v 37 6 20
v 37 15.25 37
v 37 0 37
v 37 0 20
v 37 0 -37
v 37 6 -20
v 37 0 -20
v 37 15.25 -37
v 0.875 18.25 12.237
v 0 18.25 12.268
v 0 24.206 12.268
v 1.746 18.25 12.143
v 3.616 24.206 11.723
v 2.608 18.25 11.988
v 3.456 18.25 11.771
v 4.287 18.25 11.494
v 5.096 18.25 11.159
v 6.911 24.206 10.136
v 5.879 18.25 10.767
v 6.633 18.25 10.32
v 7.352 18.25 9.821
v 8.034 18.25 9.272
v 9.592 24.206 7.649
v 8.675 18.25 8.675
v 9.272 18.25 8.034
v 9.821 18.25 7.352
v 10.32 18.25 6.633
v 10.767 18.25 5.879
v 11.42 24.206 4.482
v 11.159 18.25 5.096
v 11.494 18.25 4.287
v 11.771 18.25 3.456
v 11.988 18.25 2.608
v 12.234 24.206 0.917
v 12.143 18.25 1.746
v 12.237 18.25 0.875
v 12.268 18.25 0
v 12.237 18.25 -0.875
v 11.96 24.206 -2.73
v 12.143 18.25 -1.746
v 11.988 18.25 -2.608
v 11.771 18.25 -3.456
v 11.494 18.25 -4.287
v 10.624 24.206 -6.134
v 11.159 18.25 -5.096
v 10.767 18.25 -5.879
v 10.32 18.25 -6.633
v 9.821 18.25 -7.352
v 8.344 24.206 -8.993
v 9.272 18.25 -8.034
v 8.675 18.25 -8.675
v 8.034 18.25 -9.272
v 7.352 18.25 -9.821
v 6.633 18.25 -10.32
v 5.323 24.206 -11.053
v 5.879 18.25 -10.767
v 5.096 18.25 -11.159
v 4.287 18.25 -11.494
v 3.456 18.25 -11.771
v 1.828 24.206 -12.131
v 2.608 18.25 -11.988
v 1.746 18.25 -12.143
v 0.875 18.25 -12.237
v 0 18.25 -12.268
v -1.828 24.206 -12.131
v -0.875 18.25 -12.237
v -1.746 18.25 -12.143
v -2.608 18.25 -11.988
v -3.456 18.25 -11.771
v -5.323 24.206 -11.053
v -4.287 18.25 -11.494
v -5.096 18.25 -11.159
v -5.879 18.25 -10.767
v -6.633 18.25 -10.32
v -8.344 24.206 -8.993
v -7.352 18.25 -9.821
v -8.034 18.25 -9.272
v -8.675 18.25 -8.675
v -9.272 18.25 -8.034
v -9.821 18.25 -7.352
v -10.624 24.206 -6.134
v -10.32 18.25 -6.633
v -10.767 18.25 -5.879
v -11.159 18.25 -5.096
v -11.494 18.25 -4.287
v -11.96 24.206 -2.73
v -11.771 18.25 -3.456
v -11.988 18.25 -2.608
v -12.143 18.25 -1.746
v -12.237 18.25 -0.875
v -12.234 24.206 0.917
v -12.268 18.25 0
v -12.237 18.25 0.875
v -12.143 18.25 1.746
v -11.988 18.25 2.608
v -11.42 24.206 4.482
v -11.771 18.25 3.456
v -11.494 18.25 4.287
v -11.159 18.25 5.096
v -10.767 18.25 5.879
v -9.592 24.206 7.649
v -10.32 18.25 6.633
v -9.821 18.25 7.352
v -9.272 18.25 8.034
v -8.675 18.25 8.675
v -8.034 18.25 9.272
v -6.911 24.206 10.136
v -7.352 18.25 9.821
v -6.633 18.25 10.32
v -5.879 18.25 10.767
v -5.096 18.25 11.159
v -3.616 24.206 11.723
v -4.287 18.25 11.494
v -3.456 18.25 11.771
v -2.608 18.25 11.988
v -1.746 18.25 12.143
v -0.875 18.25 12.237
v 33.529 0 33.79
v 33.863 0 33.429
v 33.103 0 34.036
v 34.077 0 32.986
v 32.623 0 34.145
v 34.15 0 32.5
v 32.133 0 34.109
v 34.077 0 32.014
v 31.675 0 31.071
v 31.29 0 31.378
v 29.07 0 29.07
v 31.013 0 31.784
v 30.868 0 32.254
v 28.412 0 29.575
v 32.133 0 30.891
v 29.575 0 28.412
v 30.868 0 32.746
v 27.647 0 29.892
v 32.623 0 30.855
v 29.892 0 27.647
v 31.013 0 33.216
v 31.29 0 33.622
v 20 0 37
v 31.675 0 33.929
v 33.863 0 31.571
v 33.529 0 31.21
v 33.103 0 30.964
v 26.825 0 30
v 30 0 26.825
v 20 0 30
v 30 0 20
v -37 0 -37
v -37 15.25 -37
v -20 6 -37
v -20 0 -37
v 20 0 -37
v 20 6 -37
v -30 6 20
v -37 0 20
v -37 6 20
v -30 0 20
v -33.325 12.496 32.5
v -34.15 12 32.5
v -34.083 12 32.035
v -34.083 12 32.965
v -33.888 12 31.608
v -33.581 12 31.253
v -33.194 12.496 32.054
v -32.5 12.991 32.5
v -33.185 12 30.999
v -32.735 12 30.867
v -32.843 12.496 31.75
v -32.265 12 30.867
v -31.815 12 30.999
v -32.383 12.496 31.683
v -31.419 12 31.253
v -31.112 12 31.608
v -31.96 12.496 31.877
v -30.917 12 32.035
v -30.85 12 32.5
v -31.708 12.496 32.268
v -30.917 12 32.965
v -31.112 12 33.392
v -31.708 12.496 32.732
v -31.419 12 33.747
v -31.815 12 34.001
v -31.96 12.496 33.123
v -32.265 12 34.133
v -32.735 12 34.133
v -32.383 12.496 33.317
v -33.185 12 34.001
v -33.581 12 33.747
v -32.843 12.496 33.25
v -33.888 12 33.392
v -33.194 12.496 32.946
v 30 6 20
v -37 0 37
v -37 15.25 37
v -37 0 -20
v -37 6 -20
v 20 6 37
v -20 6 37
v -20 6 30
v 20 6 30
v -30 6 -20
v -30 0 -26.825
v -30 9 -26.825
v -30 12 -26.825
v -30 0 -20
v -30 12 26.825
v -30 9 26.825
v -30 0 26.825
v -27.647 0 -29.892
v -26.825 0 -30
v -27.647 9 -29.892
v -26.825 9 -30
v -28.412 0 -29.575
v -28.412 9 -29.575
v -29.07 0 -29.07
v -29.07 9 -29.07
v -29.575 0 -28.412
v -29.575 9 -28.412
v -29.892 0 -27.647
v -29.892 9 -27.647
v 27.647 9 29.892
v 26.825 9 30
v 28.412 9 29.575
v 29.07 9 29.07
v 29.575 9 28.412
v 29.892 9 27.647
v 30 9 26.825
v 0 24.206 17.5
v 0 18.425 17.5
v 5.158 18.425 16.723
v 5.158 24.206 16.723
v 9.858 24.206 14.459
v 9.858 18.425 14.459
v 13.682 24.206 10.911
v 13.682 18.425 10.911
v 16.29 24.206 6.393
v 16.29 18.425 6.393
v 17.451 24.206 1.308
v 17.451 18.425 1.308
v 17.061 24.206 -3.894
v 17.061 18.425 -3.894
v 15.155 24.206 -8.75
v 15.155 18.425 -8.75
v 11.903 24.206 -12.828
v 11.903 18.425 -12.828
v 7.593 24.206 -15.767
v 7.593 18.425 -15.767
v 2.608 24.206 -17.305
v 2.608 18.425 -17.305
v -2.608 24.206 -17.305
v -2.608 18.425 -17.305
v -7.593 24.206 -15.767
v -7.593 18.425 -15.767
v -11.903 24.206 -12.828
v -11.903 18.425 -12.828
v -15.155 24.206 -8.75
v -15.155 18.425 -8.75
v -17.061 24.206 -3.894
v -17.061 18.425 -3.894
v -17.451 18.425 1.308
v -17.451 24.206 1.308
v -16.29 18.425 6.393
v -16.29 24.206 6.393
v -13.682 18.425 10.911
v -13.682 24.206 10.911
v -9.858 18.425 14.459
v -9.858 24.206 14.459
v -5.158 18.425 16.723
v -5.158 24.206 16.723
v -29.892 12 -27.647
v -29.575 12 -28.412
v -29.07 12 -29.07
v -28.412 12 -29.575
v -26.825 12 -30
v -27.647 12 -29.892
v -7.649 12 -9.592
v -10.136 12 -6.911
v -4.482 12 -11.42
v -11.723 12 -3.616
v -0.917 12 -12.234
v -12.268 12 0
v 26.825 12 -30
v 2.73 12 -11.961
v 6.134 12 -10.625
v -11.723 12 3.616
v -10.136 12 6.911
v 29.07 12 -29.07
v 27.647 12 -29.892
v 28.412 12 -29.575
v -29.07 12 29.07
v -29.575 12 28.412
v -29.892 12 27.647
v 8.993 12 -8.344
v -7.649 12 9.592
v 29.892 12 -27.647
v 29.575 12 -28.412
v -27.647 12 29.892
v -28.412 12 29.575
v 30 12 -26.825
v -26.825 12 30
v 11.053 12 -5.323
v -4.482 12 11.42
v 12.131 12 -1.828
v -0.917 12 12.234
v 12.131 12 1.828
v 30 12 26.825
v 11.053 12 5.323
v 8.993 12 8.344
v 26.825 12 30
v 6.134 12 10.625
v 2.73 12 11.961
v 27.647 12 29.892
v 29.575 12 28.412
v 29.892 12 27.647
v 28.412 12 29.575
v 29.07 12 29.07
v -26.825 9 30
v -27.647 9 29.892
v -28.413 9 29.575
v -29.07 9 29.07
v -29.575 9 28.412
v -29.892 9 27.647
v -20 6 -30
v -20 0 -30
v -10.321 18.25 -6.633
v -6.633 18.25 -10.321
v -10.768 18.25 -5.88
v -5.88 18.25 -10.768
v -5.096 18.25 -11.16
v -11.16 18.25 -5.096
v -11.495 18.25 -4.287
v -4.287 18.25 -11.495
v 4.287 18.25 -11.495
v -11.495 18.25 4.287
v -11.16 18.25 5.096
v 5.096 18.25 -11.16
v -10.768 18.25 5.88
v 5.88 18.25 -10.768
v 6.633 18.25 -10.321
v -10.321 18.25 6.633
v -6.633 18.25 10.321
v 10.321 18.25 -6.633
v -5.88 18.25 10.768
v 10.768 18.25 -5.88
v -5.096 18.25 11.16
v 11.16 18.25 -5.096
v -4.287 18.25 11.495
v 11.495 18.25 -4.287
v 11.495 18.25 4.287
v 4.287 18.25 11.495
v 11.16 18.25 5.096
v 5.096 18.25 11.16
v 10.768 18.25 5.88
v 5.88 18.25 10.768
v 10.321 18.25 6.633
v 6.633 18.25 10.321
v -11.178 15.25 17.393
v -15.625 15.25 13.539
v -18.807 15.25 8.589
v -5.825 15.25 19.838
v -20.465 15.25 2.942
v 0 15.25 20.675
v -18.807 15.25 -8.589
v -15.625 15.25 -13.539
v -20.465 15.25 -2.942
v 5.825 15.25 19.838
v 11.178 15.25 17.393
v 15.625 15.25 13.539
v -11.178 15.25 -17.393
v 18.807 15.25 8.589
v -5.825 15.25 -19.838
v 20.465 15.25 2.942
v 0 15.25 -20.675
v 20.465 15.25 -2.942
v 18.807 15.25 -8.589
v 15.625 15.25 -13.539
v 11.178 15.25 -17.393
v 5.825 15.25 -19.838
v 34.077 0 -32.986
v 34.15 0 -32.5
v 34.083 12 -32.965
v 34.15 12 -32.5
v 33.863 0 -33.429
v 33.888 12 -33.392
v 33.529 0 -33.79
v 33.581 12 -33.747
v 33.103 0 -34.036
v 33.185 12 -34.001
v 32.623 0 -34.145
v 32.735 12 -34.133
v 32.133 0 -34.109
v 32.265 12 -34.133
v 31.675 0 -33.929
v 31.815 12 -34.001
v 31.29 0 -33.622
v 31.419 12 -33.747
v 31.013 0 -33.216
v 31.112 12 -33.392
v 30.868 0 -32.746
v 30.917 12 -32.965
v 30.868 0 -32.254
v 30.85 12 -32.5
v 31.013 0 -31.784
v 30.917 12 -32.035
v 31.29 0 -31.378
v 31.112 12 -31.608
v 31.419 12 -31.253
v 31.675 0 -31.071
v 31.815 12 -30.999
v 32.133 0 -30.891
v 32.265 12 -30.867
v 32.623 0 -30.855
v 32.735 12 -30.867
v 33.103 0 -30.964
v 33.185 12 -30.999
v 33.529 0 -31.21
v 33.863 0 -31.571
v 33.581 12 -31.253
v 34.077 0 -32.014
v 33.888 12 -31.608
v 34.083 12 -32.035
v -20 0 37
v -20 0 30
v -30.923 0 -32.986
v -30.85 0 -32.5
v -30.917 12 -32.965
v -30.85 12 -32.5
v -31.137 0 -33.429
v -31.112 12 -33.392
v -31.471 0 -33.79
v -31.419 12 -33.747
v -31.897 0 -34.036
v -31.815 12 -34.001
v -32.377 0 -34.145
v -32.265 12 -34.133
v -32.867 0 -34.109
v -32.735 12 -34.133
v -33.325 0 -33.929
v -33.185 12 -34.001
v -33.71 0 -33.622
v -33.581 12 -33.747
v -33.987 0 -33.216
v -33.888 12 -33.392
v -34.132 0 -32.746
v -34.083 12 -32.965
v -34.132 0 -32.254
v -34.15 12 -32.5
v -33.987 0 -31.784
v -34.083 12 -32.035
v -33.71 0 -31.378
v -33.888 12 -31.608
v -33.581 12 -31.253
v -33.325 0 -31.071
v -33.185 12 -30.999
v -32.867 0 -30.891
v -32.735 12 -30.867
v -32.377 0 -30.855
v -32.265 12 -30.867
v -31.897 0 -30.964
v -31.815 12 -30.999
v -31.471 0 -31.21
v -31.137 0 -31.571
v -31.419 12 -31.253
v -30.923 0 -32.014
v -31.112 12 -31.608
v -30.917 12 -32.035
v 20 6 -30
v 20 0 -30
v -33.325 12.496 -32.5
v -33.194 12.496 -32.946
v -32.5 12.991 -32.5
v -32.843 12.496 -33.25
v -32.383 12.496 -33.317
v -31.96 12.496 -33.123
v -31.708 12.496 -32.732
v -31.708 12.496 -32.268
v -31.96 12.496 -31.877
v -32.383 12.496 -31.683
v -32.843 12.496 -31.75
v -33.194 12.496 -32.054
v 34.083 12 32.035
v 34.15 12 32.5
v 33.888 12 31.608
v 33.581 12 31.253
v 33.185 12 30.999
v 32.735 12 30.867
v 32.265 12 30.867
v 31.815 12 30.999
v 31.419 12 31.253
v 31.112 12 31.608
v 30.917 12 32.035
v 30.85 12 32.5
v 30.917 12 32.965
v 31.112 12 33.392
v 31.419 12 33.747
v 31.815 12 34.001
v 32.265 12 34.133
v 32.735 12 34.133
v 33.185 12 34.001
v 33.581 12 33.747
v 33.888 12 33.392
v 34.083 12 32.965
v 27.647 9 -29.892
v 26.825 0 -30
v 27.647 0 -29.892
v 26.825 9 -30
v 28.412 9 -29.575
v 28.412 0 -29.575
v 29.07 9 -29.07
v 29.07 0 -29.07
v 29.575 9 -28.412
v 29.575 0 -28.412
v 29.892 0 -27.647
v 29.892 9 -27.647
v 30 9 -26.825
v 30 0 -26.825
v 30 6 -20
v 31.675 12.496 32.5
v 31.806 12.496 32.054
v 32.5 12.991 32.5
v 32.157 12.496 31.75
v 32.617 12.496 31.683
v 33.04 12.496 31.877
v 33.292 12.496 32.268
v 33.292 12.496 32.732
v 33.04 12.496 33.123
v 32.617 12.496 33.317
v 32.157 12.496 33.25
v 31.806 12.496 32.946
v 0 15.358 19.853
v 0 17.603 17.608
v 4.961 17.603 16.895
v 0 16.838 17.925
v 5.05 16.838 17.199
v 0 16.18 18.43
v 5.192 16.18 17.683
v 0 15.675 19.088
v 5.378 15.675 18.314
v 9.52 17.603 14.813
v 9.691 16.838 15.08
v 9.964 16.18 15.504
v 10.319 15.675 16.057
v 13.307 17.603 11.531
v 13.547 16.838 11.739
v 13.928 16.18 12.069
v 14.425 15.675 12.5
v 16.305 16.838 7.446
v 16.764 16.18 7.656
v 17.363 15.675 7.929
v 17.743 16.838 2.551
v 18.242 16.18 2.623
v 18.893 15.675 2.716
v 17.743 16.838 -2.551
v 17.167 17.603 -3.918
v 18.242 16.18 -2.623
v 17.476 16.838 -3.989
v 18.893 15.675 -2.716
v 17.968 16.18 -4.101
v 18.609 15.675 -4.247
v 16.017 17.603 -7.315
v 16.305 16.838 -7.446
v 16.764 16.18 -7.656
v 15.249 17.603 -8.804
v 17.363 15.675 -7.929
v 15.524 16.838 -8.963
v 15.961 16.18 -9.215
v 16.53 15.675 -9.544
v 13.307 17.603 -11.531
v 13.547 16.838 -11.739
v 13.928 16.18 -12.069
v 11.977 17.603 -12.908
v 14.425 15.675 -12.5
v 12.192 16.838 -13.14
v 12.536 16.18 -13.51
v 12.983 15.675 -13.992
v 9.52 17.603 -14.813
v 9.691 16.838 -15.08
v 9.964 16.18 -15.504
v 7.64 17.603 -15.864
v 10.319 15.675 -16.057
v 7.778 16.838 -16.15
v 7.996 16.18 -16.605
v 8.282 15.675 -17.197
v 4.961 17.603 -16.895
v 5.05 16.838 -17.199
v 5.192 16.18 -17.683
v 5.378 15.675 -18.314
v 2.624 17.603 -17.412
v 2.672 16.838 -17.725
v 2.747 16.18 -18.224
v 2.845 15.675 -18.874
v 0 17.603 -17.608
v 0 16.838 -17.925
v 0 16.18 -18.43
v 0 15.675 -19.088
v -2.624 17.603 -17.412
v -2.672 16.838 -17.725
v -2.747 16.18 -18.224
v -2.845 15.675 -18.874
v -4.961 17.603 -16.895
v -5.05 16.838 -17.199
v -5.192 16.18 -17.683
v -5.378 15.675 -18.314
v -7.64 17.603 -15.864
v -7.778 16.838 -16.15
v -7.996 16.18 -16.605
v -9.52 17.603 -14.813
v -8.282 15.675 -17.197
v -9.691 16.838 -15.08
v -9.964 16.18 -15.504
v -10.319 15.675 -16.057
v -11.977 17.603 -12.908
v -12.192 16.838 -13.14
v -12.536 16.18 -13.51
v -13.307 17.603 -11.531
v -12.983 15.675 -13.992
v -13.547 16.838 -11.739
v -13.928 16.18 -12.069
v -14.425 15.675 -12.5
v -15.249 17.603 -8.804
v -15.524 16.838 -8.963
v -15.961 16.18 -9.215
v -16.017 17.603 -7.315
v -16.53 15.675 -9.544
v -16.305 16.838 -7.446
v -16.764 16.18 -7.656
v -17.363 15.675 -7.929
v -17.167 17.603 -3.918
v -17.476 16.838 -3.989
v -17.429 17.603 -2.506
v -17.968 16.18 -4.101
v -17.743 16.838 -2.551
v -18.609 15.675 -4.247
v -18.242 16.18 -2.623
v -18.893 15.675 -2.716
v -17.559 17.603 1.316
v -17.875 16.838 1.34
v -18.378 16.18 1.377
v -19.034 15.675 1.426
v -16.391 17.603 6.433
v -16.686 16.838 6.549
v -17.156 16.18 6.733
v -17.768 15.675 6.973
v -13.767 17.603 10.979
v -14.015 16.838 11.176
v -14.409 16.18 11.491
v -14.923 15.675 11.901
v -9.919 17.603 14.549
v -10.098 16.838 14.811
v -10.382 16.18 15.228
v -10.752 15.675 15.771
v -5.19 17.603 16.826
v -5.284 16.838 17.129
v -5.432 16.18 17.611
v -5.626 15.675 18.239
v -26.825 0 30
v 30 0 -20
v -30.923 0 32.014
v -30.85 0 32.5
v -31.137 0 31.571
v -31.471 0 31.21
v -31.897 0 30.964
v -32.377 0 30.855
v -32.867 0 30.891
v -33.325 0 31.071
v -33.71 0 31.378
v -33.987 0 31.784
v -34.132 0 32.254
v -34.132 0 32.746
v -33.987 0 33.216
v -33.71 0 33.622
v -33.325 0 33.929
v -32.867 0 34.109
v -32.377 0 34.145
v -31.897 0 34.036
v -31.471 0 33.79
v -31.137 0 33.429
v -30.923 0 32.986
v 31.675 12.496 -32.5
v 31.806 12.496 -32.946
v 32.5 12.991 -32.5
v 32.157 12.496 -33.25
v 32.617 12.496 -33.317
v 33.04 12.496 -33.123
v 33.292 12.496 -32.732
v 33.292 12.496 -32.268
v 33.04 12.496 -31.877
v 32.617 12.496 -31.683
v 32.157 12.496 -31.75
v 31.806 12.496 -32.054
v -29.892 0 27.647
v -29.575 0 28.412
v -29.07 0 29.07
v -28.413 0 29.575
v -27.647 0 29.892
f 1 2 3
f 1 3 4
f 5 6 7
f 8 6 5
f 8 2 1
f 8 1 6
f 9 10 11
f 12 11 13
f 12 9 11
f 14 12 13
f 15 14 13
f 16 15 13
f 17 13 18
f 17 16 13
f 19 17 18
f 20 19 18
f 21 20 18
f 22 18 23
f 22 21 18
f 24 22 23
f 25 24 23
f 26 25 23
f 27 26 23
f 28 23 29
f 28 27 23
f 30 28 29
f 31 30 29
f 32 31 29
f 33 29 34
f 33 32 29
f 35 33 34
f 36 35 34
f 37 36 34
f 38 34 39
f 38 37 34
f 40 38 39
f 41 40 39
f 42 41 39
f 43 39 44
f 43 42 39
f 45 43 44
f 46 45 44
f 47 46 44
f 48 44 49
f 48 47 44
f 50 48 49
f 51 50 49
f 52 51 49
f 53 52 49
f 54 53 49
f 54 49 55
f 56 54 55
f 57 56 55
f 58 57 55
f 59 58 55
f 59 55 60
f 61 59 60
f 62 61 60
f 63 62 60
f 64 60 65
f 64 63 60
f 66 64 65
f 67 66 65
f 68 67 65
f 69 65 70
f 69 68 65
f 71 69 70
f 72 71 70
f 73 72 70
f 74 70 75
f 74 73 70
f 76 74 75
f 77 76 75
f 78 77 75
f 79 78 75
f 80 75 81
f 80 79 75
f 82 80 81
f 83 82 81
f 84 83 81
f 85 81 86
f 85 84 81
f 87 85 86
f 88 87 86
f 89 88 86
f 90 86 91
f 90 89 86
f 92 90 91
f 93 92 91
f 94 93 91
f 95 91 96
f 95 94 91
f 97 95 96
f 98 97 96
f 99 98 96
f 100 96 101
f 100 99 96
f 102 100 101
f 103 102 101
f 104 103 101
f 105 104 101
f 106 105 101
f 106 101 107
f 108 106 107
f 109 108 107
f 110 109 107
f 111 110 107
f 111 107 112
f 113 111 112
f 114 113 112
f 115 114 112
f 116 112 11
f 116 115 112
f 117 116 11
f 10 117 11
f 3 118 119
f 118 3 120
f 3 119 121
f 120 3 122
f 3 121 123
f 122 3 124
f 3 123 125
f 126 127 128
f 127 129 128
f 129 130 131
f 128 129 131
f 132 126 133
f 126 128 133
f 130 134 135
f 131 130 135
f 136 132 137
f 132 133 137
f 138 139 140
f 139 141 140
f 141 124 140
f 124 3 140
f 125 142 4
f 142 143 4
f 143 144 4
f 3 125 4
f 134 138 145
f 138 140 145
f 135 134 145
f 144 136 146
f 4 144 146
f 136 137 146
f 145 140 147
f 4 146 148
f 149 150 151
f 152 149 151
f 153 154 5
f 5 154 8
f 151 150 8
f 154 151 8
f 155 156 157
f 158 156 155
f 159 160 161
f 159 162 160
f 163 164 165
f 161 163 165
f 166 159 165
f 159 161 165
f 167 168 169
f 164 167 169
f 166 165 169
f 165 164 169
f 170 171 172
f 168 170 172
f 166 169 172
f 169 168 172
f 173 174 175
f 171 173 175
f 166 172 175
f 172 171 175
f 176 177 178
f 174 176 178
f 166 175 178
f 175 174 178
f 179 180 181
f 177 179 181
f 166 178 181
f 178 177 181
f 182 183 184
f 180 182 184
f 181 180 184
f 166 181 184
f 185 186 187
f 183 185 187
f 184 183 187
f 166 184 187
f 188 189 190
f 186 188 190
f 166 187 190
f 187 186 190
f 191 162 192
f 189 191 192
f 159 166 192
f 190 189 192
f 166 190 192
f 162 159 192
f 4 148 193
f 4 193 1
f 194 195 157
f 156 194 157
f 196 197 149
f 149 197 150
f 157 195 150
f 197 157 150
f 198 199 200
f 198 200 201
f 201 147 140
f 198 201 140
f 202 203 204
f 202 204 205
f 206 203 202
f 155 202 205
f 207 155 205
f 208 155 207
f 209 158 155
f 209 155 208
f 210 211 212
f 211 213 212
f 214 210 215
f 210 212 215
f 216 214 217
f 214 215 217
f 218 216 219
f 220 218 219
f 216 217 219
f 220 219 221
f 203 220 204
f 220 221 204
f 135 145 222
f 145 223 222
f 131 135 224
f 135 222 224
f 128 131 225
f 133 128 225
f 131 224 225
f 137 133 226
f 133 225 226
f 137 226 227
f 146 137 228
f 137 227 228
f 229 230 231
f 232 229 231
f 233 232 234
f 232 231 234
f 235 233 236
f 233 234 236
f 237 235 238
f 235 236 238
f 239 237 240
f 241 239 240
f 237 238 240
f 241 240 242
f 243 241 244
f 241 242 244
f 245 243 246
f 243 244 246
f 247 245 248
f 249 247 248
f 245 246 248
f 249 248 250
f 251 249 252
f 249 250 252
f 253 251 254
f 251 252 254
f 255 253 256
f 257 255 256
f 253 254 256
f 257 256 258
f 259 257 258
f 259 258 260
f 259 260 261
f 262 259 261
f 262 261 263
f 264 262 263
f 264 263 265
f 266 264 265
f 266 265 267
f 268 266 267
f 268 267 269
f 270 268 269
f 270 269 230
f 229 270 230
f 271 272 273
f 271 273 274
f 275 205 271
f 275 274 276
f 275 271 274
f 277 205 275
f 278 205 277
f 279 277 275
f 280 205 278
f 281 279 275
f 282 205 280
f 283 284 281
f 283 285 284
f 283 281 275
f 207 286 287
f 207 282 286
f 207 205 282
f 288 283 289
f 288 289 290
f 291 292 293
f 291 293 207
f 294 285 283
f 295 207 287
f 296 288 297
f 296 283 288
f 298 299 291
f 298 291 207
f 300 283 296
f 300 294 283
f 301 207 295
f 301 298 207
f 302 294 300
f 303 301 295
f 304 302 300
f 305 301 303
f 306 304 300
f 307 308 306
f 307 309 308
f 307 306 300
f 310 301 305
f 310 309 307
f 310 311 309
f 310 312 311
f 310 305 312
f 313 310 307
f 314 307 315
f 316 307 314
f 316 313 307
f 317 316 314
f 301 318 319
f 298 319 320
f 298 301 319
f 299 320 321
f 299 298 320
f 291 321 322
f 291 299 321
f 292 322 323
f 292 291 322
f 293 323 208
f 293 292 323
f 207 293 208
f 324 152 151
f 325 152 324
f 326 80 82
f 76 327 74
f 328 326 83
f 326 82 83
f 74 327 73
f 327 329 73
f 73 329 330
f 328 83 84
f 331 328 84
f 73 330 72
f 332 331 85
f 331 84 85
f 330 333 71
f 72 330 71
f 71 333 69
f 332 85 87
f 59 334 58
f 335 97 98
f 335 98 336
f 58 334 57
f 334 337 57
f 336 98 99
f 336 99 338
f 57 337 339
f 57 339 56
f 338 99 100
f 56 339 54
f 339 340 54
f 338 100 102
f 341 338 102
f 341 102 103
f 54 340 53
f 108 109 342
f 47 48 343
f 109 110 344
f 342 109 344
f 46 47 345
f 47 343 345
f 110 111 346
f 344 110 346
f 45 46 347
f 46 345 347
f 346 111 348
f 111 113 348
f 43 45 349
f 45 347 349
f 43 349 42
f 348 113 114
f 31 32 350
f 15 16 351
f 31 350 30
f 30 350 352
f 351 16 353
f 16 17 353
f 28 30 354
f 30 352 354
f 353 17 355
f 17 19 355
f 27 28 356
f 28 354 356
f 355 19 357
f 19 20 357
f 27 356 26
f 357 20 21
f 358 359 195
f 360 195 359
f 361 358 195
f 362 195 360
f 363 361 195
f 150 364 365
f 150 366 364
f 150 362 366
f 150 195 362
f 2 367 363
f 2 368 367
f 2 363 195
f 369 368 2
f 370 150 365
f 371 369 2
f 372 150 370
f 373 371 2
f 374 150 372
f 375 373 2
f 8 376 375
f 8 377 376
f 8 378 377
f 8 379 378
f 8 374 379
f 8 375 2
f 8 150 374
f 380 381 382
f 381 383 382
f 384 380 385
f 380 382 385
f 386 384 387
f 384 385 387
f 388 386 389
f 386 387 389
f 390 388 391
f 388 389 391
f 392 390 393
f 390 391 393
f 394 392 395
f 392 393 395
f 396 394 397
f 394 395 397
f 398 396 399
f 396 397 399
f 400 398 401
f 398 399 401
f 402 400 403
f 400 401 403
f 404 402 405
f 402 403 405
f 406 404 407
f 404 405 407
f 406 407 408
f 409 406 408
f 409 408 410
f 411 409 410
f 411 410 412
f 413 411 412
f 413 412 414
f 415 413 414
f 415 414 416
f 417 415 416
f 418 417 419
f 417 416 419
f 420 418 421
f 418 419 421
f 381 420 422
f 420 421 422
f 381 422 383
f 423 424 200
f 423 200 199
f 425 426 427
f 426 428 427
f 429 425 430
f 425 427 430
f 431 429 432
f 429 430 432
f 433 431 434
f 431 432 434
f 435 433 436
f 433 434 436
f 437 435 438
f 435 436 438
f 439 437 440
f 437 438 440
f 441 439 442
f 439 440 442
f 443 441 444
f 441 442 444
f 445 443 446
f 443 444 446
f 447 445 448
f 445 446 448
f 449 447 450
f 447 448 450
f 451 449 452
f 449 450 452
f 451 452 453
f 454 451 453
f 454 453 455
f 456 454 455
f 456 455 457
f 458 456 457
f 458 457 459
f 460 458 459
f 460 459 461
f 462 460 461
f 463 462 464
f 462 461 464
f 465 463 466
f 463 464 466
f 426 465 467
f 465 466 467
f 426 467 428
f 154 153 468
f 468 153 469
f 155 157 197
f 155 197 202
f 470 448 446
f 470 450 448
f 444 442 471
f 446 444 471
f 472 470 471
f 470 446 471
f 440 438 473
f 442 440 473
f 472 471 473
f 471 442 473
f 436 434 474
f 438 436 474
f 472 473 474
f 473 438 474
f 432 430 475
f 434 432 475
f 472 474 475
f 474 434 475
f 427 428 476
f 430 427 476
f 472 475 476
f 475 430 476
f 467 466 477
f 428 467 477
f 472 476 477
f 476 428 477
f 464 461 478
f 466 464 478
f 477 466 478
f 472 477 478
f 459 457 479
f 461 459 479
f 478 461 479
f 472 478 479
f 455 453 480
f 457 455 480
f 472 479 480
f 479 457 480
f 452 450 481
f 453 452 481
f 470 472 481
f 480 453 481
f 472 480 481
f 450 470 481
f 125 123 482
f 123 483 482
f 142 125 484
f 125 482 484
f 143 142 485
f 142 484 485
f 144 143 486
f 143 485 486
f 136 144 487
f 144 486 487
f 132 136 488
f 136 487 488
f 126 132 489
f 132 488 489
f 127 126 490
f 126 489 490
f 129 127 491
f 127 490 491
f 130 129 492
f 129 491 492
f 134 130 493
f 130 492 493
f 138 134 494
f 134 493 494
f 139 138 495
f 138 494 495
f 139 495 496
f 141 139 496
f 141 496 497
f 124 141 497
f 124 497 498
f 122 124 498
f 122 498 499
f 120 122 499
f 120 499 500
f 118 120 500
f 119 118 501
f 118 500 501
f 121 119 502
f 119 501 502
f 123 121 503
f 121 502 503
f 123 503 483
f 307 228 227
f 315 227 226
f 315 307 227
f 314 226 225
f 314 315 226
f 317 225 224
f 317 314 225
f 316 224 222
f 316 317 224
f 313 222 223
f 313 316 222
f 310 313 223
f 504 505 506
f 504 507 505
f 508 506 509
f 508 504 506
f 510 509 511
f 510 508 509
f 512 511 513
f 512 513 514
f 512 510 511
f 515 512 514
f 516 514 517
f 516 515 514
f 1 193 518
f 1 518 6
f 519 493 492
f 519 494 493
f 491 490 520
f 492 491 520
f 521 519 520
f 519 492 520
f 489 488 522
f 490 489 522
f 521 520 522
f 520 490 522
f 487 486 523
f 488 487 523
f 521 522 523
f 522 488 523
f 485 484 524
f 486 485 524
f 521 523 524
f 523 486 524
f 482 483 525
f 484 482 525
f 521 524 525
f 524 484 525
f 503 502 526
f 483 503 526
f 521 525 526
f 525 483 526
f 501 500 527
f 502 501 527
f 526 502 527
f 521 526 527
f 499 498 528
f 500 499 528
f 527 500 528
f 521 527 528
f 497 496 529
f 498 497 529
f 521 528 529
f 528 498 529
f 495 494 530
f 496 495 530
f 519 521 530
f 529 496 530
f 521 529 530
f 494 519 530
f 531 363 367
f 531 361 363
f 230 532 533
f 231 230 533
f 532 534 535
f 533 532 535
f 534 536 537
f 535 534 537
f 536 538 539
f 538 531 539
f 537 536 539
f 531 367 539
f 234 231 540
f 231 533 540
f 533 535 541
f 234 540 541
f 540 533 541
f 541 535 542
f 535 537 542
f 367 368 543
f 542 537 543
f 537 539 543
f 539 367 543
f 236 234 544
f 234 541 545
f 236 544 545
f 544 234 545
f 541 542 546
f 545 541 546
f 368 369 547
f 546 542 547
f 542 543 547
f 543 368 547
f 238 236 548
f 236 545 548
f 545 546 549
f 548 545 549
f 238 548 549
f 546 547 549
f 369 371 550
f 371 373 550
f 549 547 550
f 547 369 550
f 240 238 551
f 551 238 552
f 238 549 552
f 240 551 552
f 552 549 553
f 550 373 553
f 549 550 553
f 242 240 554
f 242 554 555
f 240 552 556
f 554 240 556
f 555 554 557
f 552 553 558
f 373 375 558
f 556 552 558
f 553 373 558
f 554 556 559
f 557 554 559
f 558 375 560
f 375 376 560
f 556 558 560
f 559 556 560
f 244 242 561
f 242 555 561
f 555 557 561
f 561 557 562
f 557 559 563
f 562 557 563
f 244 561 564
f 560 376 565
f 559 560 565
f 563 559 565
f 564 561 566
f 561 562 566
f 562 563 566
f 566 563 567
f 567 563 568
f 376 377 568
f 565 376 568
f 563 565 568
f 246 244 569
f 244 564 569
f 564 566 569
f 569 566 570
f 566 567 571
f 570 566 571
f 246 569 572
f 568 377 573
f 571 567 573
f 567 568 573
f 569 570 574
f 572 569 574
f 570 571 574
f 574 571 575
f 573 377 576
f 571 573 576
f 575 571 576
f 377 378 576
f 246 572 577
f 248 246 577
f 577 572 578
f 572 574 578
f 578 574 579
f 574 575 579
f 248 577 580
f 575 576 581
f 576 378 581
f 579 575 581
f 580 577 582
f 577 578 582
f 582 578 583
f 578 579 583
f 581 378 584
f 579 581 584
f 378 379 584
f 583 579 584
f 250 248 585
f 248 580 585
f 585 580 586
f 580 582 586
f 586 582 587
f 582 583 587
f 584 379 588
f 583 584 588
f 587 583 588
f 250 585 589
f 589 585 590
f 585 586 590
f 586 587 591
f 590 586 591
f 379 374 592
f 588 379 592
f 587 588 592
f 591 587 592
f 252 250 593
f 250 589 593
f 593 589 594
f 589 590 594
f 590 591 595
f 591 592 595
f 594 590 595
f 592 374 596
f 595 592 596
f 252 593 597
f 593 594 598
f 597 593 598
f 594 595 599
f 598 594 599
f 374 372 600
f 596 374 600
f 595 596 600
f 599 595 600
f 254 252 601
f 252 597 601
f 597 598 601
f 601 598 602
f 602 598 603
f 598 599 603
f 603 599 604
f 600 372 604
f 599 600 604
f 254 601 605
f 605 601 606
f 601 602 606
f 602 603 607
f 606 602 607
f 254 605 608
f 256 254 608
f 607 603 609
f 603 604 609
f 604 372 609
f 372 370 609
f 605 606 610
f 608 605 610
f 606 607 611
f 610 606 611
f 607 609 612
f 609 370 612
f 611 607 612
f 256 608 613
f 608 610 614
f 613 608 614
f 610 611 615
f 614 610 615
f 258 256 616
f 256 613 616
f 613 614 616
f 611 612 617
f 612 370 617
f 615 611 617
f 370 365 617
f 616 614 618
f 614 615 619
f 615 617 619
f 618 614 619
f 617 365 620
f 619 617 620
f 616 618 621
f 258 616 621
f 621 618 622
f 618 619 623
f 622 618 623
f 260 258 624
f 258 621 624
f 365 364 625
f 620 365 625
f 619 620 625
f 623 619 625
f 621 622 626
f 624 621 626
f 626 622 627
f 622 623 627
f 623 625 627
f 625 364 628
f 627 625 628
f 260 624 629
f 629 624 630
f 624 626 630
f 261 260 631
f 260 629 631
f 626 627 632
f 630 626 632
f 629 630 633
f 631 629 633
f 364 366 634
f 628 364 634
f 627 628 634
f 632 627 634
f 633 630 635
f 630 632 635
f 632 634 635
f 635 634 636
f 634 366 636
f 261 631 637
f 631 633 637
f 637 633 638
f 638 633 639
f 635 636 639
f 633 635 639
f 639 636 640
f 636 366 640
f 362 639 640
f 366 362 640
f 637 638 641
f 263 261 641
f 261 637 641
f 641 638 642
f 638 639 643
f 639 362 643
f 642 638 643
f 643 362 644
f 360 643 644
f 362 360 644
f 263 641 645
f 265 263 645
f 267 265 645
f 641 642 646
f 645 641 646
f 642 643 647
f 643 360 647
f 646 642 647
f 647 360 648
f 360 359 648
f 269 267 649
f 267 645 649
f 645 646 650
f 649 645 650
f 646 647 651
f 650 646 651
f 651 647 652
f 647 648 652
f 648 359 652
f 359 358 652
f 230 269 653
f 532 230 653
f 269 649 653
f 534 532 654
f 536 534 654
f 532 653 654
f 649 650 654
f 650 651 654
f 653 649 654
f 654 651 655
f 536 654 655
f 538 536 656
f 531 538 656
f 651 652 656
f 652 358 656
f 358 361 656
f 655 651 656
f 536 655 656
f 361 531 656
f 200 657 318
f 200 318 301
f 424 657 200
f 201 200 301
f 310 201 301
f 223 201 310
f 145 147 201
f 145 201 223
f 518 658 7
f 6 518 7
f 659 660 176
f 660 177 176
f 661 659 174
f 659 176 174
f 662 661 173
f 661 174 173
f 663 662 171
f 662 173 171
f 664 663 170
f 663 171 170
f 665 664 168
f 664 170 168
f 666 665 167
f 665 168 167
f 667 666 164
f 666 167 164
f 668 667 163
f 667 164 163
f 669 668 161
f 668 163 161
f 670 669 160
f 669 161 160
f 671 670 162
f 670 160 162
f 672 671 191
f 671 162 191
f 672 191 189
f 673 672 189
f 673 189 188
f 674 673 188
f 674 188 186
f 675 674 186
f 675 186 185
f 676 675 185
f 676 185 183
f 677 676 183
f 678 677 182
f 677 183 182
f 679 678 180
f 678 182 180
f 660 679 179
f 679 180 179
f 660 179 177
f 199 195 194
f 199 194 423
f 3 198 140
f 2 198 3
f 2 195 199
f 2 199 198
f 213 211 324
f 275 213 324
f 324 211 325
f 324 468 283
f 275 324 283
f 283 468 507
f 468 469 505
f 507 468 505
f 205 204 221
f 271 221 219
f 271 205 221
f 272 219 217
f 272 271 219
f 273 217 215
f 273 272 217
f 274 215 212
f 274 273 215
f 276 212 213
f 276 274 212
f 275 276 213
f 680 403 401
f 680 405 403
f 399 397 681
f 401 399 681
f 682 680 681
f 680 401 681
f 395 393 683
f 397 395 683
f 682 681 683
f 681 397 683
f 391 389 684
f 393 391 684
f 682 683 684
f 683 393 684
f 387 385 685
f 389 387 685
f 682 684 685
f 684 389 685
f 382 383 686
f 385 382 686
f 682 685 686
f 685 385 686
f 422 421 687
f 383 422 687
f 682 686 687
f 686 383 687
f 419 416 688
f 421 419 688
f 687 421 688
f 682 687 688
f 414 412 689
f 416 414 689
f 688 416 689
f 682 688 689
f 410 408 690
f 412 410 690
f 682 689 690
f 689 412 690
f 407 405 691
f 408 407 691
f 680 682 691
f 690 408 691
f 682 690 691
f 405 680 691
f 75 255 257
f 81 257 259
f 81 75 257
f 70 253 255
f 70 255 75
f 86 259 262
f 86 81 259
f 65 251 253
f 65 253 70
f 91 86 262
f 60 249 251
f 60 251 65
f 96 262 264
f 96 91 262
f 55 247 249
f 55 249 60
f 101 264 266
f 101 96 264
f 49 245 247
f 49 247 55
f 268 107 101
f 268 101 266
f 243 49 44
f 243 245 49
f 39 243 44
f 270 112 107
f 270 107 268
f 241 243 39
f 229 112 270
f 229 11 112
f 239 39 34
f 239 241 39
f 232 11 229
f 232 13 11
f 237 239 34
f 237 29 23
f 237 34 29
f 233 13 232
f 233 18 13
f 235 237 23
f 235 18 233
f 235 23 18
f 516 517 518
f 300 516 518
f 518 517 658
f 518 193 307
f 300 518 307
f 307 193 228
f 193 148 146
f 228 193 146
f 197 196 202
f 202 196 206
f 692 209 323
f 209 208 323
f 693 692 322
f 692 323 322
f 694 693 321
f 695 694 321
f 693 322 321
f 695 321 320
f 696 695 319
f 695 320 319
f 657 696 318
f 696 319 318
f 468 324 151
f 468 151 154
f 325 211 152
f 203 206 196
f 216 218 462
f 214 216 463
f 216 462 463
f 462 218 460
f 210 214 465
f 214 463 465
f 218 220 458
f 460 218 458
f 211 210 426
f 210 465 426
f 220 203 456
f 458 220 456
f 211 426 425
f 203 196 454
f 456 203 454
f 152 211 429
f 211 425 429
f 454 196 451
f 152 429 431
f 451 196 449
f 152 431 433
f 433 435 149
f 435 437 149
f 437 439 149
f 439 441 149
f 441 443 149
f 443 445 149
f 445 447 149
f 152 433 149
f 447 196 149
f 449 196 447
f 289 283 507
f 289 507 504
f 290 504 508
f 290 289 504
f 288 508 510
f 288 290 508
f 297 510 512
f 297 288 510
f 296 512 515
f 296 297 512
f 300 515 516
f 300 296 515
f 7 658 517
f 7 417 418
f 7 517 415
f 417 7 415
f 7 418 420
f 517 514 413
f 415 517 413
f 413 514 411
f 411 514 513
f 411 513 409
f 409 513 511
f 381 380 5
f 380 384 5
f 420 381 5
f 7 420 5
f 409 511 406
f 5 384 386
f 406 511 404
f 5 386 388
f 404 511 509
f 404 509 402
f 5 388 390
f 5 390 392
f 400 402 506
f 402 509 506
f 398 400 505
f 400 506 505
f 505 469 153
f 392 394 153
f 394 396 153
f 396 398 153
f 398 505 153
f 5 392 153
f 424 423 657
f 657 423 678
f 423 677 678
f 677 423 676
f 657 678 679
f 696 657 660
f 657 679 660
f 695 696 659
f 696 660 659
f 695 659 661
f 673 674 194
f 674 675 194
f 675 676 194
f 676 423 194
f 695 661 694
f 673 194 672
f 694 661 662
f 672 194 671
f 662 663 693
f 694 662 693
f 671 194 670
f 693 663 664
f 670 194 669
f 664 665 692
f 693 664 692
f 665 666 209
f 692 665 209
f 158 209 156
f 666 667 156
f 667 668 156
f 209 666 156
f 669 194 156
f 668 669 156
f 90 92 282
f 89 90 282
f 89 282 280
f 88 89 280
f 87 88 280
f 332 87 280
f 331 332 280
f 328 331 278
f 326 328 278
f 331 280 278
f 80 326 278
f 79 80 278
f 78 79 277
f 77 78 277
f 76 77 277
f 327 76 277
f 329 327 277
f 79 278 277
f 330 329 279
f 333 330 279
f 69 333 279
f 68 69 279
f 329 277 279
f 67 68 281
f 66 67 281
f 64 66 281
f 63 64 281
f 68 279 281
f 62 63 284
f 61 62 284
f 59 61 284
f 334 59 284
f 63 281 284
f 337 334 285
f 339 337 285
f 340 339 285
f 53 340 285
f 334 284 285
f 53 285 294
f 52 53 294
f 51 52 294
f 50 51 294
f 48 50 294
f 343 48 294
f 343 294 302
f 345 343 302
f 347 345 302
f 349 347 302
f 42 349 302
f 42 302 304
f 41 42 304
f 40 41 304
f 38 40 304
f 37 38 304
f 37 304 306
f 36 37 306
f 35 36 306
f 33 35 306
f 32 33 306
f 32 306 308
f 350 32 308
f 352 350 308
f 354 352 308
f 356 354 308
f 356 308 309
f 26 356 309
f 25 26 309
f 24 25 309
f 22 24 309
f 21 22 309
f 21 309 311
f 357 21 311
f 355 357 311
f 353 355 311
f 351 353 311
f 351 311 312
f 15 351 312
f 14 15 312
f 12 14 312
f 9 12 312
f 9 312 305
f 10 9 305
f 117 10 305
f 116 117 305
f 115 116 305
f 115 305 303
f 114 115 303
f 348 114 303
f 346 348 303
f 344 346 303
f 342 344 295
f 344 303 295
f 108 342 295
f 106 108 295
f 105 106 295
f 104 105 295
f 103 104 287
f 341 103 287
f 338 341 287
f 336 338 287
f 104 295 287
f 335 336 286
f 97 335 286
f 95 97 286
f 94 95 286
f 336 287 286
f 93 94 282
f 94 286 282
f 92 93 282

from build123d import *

# Parameters (mm, degrees)
OUTLINE_DEPTH        = 40
OUTLINE_DEPTH_BACK   = 40
SKETCH1_W            = 18.25
SKETCH1_H            = 40
SKETCH2_W            = 40
SKETCH2_H            = 80
EXTRUSION15_DEPTH    = 6
CAMERA_MOUNT_D       = 24.5364
SKETCH5_R            = 17.5
SKETCH5_R_2          = 12.268
EXTRUSION19_DEPTH    = 5.9562
CUT_EXTRUDE1_START   = -3
SKETCH10_W           = 80
SKETCH10_H           = 80
SKETCH10_R           = 17.5
CUT_EXTRUDE1_DEPTH   = 3
SKETCH6_W            = 80
SKETCH6_H            = 40
EXTRUSION21_DEPTH    = 6
SKETCH7_W            = 60
SKETCH7_H            = 60
EXTRUSION22_DEPTH    = 9
FILLET4_R            = 3.175
HOLE7_D              = 3.3
HOLE7_DEPTH          = 12
HOLE7_TIP            = 0.991420021
SKETCH11_OUTSIDE_W   = 105.14
SKETCH11_OUTSIDE_H   = 105.14
SKETCH11_OUTSIDE_W_2 = 74
SKETCH11_OUTSIDE_H_2 = 74
CUT_EXTRUDE2_DEPTH   = 59.588074725
CUT_EXTRUDE3_START   = -3
CUT_EXTRUDE3_DEPTH   = 3


with BuildPart() as part:
    # Sketch1 → Outline (new, two sides: drawn at the far end of the back side and taken through both)
    with BuildSketch(Plane.YZ.offset(-OUTLINE_DEPTH_BACK)):
        Polygon((18.25, 40), (5.33, 40), (0, 40), (0, 0), (18.25, 0), align=None)
        with Locations((9.125, -20)):
            Rectangle(SKETCH1_W, SKETCH1_H)
    extrude(amount=OUTLINE_DEPTH + OUTLINE_DEPTH_BACK)

    # Sketch2 → Extrusion15 (cut)
    with BuildSketch(Plane.XZ):
        Rectangle(SKETCH2_W, SKETCH2_H)
    extrude(amount=-EXTRUSION15_DEPTH, mode=Mode.SUBTRACT)

    # Camera mount (through all)
    with Locations(Plane(origin=(0, 18.25, 0), x_dir=(1, 0, 0), z_dir=(0, 1, 0))):
        with Locations((0, 0)):
            Hole(CAMERA_MOUNT_D / 2)

    # Sketch5 → Extrusion19 (add)
    with BuildSketch(Plane(origin=(0, 18.25, 0), x_dir=(-1, 0, 0), z_dir=(0, 1, 0))):
        with Locations(Location((0, 0, 0), (0, 0, 90))):
            Circle(SKETCH5_R)
        with Locations(Location((0, 0, 0), (0, 0, 90))):
            Circle(SKETCH5_R_2, mode=Mode.SUBTRACT)
    extrude(amount=EXTRUSION19_DEPTH)

    # Sketch10 → Cut-Extrude1 (cut)
    with BuildSketch(Plane(origin=(0, 18.25, 0), x_dir=(1, 0, 0), z_dir=(0, 1, 0)).offset(CUT_EXTRUDE1_START)):
        Rectangle(SKETCH10_W, SKETCH10_H)
        with Locations(Location((0, 0, 0), (0, 0, 270))):
            Circle(SKETCH10_R, mode=Mode.SUBTRACT)
    extrude(amount=CUT_EXTRUDE1_DEPTH, mode=Mode.SUBTRACT)

    # Sketch6 → Extrusion21 (cut)
    with BuildSketch(Plane.XZ):
        Rectangle(SKETCH6_W, SKETCH6_H)
    extrude(amount=-EXTRUSION21_DEPTH, mode=Mode.SUBTRACT)

    # Sketch7 → Extrusion22 (cut)
    with BuildSketch(Plane.XZ):
        Rectangle(SKETCH7_W, SKETCH7_H)
    extrude(amount=-EXTRUSION22_DEPTH, mode=Mode.SUBTRACT)

    # Fillet4
    fillet4_edges = [part.edges().sort_by_distance(p)[0] for p in [
        (-30, 4.5, 30),
        (30, 4.5, -30),
        (30, 4.5, 30),
        (-30, 4.5, -30),
        (0, 15.25, -17.5),
    ]]
    fillet(fillet4_edges, radius=FILLET4_R)

    # Hole7
    with Locations(Plane(origin=(0, 0, 0), x_dir=(-1, 0, 0), z_dir=(0, -1, 0))):
        with Locations((32.5, 32.5), (-32.5, 32.5), (-32.5, -32.5), (32.5, -32.5)):
            Hole(HOLE7_D / 2, depth=HOLE7_DEPTH)
            with Locations((0, 0, -(HOLE7_DEPTH + HOLE7_TIP / 2))):  # 118° drill point
                Cone(0, HOLE7_D / 2, HOLE7_TIP, mode=Mode.SUBTRACT)

    # Sketch11 outside → Cut-Extrude2 (cut, through all)
    with BuildSketch(Plane(origin=(0, 15.25, 0), x_dir=(1, 0, 0), z_dir=(0, 1, 0))):
        Rectangle(SKETCH11_OUTSIDE_W, SKETCH11_OUTSIDE_H)
        Rectangle(SKETCH11_OUTSIDE_W_2, SKETCH11_OUTSIDE_H_2, mode=Mode.SUBTRACT)
    extrude(amount=-CUT_EXTRUDE2_DEPTH, mode=Mode.SUBTRACT)

    # Sketch13 → Cut-Extrude3 (cut)
    with BuildSketch(Plane.XZ.offset(-9).offset(CUT_EXTRUDE3_START)):
        with BuildLine():
            Line((26.825, 30), (-26.825, 30))
            ThreePointArc((-26.825, 30), (-29.07006403, 29.07006403), (-30, 26.825))
            Line((-30, 26.825), (-30, -26.825))
            ThreePointArc((-30, -26.825), (-29.07006403, -29.07006403), (-26.825, -30))
            Line((-26.825, -30), (26.825, -30))
            ThreePointArc((26.825, -30), (29.07006403, -29.07006403), (30, -26.825))
            Line((30, -26.825), (30, 26.825))
            ThreePointArc((30, 26.825), (29.07006403, 29.07006403), (26.825, 30))
        make_face()
    extrude(amount=CUT_EXTRUDE3_DEPTH, mode=Mode.SUBTRACT)


solid = part.part
